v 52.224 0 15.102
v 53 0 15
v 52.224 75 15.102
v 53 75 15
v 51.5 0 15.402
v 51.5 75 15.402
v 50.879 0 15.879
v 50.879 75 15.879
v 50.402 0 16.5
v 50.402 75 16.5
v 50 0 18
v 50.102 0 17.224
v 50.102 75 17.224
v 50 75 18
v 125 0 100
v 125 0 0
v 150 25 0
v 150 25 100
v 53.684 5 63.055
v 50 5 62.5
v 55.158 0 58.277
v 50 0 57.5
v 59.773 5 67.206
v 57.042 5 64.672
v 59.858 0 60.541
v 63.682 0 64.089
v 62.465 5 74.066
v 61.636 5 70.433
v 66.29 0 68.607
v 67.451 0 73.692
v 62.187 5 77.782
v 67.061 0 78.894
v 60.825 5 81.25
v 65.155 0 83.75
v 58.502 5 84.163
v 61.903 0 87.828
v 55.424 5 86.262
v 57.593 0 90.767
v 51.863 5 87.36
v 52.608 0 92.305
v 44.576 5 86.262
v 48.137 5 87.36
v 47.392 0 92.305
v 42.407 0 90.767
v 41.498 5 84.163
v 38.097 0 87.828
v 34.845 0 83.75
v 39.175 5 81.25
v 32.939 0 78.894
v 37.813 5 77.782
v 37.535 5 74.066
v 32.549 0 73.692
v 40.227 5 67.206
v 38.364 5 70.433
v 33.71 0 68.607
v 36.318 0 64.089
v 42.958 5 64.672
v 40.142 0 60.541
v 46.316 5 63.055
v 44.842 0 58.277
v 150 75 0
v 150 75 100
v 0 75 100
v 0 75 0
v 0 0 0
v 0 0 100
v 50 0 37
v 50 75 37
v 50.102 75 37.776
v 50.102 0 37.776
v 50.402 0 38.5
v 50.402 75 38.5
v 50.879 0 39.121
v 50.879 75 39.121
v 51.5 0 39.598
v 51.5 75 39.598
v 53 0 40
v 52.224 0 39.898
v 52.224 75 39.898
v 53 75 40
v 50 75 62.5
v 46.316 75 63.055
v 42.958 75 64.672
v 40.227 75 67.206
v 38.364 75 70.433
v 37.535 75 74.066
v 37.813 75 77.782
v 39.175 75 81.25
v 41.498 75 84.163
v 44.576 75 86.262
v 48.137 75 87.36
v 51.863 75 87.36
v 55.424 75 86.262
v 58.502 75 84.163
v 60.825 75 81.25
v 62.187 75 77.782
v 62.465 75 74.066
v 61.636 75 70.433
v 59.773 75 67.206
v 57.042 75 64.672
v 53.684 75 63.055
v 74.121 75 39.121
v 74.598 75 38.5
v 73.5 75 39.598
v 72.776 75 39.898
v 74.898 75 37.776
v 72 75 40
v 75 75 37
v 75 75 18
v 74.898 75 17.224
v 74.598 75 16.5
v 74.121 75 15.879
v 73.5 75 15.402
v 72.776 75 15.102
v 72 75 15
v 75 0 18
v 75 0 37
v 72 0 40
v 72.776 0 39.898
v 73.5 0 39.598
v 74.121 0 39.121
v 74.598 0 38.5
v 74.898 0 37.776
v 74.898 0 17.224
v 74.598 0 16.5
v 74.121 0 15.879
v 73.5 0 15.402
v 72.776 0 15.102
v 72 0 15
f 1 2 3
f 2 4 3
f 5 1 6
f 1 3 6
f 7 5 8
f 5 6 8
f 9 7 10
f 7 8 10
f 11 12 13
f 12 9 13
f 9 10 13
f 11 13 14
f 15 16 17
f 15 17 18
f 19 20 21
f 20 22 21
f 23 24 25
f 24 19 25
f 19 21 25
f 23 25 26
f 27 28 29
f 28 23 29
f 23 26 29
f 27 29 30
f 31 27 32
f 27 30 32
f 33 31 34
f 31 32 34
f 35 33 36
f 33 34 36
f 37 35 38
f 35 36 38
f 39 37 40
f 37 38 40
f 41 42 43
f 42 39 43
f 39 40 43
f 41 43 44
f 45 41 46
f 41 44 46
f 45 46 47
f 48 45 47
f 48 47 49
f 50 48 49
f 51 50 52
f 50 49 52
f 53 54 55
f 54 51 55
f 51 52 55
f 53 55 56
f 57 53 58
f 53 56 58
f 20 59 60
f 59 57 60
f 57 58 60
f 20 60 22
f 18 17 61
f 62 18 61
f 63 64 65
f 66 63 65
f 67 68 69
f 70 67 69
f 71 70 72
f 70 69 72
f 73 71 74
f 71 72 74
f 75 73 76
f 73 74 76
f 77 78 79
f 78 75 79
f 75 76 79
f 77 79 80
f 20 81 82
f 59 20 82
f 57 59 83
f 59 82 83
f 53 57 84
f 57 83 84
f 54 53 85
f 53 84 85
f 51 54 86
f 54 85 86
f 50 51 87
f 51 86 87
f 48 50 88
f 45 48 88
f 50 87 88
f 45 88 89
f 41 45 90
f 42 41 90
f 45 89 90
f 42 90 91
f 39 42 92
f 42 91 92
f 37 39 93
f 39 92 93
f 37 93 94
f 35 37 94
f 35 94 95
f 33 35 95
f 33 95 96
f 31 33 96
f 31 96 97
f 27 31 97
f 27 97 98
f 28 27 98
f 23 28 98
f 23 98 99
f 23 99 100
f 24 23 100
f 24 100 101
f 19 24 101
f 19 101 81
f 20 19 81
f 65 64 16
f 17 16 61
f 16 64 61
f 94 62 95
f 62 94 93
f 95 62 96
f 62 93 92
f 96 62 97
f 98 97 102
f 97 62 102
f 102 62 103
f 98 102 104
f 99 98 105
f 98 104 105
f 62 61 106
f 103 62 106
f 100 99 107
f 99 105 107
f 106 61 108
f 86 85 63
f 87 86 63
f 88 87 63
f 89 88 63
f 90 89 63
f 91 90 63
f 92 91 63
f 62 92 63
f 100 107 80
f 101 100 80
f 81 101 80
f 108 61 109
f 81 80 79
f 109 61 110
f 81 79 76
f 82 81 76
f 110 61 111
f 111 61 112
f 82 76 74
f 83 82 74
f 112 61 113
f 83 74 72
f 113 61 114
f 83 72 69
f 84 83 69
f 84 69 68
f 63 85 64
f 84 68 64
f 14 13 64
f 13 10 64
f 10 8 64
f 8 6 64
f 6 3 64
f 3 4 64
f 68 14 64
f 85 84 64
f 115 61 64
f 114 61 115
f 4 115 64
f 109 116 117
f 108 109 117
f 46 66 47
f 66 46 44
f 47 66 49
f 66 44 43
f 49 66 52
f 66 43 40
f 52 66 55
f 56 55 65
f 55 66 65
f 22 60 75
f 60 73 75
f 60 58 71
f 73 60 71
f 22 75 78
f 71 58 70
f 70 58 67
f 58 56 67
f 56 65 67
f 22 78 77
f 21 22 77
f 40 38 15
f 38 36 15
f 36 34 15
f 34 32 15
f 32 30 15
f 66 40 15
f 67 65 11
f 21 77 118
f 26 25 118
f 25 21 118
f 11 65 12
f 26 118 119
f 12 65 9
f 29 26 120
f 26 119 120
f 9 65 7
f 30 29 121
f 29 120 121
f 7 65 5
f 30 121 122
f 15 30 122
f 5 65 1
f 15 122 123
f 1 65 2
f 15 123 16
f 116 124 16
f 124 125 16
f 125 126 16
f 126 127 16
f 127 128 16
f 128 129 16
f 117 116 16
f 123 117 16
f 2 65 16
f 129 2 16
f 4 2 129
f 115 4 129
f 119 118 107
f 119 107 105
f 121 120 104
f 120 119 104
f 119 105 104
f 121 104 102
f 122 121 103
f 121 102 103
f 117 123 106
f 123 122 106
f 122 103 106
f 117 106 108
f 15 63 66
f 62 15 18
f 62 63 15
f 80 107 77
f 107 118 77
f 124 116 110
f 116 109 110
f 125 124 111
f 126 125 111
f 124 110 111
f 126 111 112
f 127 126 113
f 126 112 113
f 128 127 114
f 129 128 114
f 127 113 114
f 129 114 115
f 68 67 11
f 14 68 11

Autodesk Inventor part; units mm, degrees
ref_plane "YZ Plane" through (0, 0, 0) normal (1, 0, 0) x (0, 1, 0)
ref_plane "XZ Plane" through (0, 0, 0) normal (0, 1, 0) x (-1, 0, 0)
ref_plane "XY Plane" through (0, 0, 0) normal (0, 0, 1) x (1, 0, 0)
sketch "Sketch1" plane through (0, 0, 0) normal (0, 0, 1) x (1, 0, 0)
  line L0 (0, 0) -> (150, 0)
  line L1 (150, 0) -> (150, 75)
  line L2 (150, 75) -> (0, 75)
  line L3 (0, 75) -> (0, 0)
  dimension "d0" = 150
  dimension "d1" = 75
extrude "Extrusion1" add sketch "Sketch1" along normal blind 100
chamfer "Chamfer1" distance 25 angle 45 1 edges at (150, 0, 50)
sketch "Sketch2" plane through (0, 0, 0) normal (0, -1, 0) x (1, 0, 0)
  line L0 (125, 100) -> (0, 100) projected
  line L1 (0, 0) -> (0, 100) projected
  point P0 (50, 75)
  dimension "d7" = 25
  dimension "d8" = 50
hole "Hole1" at (50, 0, 75) direction (0, 1, 0) diameter 25 end through all
sketch "Sketch3" plane through (0, 0, 0) normal (0, -1, 0) x (1, 0, 0)
  line L0 (75, 40) -> (50, 40)
  line L1 (50, 40) -> (50, 15)
  line L2 (50, 15) -> (75, 15)
  line L3 (75, 15) -> (75, 40)
  line L4 (125, 100) -> (125, 0) projected
  circle A0 centre (50, 75) radius 12.5 projected
  dimension "d16" = 25
  dimension "d17" = 50
  dimension "d18" = 35
extrude "Extrusion2" cut sketch "Sketch3" against normal through all contours L3 L2 L1 L0
fillet "Fillet1" radius 3 4 edges at (50, 37.5, 15) (75, 37.5, 15) (50, 37.5, 40) (75, 37.5, 40)
chamfer "Chamfer2" distance 5 angle 45 1 edges at (50, 0, 87.5)
properties part number "pc01"
